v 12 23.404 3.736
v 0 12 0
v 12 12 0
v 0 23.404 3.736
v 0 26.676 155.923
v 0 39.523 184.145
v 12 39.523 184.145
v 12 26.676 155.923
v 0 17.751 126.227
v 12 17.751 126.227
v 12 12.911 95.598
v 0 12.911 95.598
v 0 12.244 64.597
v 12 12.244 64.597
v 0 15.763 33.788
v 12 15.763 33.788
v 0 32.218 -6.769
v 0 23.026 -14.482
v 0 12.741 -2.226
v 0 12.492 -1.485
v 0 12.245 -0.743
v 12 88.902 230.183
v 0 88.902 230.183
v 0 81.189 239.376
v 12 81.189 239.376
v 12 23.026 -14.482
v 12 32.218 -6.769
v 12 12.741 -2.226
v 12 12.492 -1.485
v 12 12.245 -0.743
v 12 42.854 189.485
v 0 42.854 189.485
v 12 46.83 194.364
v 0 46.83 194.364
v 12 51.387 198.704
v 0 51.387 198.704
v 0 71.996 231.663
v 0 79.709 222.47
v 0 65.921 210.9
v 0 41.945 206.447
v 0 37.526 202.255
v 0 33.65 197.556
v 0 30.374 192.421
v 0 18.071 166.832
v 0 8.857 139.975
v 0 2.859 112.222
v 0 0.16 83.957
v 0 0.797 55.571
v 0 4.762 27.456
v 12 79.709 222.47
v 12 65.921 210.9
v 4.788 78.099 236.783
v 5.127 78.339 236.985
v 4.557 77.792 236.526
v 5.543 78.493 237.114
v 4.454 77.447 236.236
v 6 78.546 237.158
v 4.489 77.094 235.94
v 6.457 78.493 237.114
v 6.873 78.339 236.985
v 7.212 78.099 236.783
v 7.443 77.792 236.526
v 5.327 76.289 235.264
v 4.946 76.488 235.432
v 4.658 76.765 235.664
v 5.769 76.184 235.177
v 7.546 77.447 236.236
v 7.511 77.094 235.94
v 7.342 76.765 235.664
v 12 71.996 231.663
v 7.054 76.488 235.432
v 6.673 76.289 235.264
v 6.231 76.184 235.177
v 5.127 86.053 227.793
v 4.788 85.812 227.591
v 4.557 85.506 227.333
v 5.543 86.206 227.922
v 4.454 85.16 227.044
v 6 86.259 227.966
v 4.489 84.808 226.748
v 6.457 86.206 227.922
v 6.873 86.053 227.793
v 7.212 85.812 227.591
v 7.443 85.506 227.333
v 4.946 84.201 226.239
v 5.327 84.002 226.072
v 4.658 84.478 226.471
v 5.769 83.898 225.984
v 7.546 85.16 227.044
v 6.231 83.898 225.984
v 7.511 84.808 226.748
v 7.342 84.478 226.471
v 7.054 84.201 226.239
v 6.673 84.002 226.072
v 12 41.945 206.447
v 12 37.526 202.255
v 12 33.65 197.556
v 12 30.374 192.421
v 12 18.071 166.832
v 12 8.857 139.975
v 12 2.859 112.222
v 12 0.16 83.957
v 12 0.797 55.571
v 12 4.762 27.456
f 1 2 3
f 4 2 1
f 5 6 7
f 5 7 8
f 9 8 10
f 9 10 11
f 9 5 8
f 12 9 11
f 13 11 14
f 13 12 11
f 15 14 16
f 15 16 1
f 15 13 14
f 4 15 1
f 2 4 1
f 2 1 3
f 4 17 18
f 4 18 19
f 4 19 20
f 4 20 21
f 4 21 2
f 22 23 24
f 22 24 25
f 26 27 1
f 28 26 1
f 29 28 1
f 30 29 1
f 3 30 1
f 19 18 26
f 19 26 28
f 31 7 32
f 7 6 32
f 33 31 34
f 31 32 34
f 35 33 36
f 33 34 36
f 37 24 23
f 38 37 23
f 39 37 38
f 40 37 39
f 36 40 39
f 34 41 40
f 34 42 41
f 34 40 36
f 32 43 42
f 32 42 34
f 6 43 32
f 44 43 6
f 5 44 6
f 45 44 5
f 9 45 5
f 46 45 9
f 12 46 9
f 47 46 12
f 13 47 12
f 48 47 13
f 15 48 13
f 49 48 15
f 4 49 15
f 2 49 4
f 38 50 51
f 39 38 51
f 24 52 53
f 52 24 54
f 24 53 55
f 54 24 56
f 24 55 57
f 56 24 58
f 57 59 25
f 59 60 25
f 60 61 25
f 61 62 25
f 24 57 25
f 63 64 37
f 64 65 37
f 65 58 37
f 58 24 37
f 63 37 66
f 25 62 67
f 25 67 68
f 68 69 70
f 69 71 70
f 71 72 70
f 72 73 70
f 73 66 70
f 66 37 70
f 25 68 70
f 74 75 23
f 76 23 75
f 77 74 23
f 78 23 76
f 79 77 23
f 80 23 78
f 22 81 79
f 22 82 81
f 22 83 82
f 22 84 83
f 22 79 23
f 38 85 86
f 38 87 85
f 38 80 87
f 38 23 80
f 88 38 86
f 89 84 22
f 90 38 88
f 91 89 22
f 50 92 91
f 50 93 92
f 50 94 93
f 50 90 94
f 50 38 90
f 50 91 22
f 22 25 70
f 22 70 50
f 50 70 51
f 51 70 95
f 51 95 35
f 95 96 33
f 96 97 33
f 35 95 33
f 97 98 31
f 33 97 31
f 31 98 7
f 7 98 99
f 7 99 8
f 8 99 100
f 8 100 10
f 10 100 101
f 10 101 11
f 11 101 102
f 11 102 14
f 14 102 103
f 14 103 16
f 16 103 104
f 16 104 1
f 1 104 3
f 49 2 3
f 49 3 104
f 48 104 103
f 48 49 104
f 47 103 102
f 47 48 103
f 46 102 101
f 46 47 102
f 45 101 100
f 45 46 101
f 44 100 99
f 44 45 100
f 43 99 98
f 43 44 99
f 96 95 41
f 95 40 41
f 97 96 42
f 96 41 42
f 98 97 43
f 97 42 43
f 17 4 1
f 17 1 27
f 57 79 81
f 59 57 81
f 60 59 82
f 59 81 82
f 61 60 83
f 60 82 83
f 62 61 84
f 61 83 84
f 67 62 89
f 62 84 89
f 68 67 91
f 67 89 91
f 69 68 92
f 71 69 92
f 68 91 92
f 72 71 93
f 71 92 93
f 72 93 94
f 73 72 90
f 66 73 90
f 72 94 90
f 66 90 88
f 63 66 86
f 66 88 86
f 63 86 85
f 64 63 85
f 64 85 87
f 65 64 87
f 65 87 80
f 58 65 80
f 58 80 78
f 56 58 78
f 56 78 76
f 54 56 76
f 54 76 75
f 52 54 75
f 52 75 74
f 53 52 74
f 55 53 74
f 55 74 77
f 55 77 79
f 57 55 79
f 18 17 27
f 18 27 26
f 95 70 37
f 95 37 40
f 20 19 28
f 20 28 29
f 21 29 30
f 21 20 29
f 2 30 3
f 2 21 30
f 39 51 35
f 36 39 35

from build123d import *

# Parameters (mm, degrees)
AUFSATZ_LINEAR_AUSTRAGEN1_DEPTH = 12
AUFSATZ_LINEAR_AUSTRAGEN3_DEPTH = 12
AUFSATZ_LINEAR_AUSTRAGEN4_DEPTH = 12
SCHNITT_LINEAR_AUSTRAGEN1_DEPTH = 254.175024926
VERRUNDUNG1_R                   = 50
SKIZZE9_W                       = 12
SKIZZE9_H                       = 12
AUFSATZ_LINEAR_AUSTRAGEN6_DEPTH = 12
SKIZZE11_R                      = 1.55
SCHNITT_LINEAR_AUSTRAGEN4_DEPTH = 223.406401048


with BuildPart() as part:
    # Skizze1 → Aufsatz-Linear austragen1 (new body)
    with BuildSketch(Plane(origin=(0, 0, 0), x_dir=(0, 0, -1), z_dir=(1, 0, 0))):
        with BuildLine():
            Line((-240, 65), (-230.735708163, 72.773663864))
            ThreePointArc((-230.735708163, 72.773663864), (-123.944567763, 17.242039243), (-3.735818811, 23.403668612))
            Line((-3.735818811, 23.403668612), (0, 12))
            ThreePointArc((0, 12), (-127.247502729, 5.681119716), (-240, 65))
        make_face()
    extrude(amount=AUFSATZ_LINEAR_AUSTRAGEN1_DEPTH)

    # Skizze5 → Aufsatz-Linear austragen4 (add)
    with BuildSketch(Plane(origin=(12, 0, 0), x_dir=(0, 0, -1), z_dir=(1, 0, 0))):
        Polygon((-231.662517154, 71.995978781), (-222.469983836, 79.709430098), (-210.899806862, 65.920630121), (-192.948331238, 44.526894555), (-220.092340179, 58.207178805), align=None)
    extrude(amount=-AUFSATZ_LINEAR_AUSTRAGEN4_DEPTH)

    # Skizze6 → Schnitt-Linear austragen1 (cut, through all)
    with BuildSketch(Plane(origin=(12, 0, 0), x_dir=(0, 0, -1), z_dir=(1, 0, 0))):
        Polygon((-231.662517154, 71.995978781), (-199.510648028, 33.678873242), (-204.367668784, 29.603348917), (-240, 65), align=None)
    extrude(amount=-SCHNITT_LINEAR_AUSTRAGEN1_DEPTH, mode=Mode.SUBTRACT)

    # Verrundung1
    verrundung1_edges = [part.edges().sort_by_distance(p)[0] for p in [
        (6, 44.526894555, 192.948331238),
        (6, 35.285406895, 200.858689823),
    ]]
    fillet(verrundung1_edges, radius=VERRUNDUNG1_R)

    # Skizze9 → Aufsatz-Linear austragen6 (add)
    with BuildSketch(Plane(origin=(0, 156.320496136, 131.168470653), x_dir=(1, 0, 0), z_dir=(0, 0.7660444431189836, 0.6427876096865328))):
        with Locations((6, -125.185660837)):
            Rectangle(SKIZZE9_W, SKIZZE9_H)
    extrude(amount=AUFSATZ_LINEAR_AUSTRAGEN6_DEPTH)

    # Skizze11 → Schnitt-Linear austragen4 (cut, through all)
    with BuildSketch(Plane(origin=(0, -76.611066038, 91.301513183), x_dir=(-1, 0, 0), z_dir=(0, 0.6427876096865329, -0.7660444431189836))):
        with Locations(Location((-6, 211.061915128, 0), (0, 0, 90))):
            Circle(SKIZZE11_R)
    extrude(amount=-SCHNITT_LINEAR_AUSTRAGEN4_DEPTH, mode=Mode.SUBTRACT)


with BuildPart() as body_2:
    # Skizze4 → Aufsatz-Linear austragen3 (new body)
    with BuildSketch(Plane(origin=(0, 0, 0), x_dir=(0, 0, -1), z_dir=(1, 0, 0))):
        with BuildLine():
            Line((-3.735818811, 23.403668612), (6.769031275, 32.218284445))
            Line((6.769031275, 32.218284445), (14.482482591, 23.025751128))
            Line((14.482482591, 23.025751128), (2.225771501, 12.741149373))
            ThreePointArc((2.225771501, 12.741149373), (1.113785782, 12.367871772), (0, 12))
            Line((0, 12), (-3.735818811, 23.403668612))
        make_face()
    extrude(amount=AUFSATZ_LINEAR_AUSTRAGEN3_DEPTH)


solid = Compound([part.part, body_2.part])
